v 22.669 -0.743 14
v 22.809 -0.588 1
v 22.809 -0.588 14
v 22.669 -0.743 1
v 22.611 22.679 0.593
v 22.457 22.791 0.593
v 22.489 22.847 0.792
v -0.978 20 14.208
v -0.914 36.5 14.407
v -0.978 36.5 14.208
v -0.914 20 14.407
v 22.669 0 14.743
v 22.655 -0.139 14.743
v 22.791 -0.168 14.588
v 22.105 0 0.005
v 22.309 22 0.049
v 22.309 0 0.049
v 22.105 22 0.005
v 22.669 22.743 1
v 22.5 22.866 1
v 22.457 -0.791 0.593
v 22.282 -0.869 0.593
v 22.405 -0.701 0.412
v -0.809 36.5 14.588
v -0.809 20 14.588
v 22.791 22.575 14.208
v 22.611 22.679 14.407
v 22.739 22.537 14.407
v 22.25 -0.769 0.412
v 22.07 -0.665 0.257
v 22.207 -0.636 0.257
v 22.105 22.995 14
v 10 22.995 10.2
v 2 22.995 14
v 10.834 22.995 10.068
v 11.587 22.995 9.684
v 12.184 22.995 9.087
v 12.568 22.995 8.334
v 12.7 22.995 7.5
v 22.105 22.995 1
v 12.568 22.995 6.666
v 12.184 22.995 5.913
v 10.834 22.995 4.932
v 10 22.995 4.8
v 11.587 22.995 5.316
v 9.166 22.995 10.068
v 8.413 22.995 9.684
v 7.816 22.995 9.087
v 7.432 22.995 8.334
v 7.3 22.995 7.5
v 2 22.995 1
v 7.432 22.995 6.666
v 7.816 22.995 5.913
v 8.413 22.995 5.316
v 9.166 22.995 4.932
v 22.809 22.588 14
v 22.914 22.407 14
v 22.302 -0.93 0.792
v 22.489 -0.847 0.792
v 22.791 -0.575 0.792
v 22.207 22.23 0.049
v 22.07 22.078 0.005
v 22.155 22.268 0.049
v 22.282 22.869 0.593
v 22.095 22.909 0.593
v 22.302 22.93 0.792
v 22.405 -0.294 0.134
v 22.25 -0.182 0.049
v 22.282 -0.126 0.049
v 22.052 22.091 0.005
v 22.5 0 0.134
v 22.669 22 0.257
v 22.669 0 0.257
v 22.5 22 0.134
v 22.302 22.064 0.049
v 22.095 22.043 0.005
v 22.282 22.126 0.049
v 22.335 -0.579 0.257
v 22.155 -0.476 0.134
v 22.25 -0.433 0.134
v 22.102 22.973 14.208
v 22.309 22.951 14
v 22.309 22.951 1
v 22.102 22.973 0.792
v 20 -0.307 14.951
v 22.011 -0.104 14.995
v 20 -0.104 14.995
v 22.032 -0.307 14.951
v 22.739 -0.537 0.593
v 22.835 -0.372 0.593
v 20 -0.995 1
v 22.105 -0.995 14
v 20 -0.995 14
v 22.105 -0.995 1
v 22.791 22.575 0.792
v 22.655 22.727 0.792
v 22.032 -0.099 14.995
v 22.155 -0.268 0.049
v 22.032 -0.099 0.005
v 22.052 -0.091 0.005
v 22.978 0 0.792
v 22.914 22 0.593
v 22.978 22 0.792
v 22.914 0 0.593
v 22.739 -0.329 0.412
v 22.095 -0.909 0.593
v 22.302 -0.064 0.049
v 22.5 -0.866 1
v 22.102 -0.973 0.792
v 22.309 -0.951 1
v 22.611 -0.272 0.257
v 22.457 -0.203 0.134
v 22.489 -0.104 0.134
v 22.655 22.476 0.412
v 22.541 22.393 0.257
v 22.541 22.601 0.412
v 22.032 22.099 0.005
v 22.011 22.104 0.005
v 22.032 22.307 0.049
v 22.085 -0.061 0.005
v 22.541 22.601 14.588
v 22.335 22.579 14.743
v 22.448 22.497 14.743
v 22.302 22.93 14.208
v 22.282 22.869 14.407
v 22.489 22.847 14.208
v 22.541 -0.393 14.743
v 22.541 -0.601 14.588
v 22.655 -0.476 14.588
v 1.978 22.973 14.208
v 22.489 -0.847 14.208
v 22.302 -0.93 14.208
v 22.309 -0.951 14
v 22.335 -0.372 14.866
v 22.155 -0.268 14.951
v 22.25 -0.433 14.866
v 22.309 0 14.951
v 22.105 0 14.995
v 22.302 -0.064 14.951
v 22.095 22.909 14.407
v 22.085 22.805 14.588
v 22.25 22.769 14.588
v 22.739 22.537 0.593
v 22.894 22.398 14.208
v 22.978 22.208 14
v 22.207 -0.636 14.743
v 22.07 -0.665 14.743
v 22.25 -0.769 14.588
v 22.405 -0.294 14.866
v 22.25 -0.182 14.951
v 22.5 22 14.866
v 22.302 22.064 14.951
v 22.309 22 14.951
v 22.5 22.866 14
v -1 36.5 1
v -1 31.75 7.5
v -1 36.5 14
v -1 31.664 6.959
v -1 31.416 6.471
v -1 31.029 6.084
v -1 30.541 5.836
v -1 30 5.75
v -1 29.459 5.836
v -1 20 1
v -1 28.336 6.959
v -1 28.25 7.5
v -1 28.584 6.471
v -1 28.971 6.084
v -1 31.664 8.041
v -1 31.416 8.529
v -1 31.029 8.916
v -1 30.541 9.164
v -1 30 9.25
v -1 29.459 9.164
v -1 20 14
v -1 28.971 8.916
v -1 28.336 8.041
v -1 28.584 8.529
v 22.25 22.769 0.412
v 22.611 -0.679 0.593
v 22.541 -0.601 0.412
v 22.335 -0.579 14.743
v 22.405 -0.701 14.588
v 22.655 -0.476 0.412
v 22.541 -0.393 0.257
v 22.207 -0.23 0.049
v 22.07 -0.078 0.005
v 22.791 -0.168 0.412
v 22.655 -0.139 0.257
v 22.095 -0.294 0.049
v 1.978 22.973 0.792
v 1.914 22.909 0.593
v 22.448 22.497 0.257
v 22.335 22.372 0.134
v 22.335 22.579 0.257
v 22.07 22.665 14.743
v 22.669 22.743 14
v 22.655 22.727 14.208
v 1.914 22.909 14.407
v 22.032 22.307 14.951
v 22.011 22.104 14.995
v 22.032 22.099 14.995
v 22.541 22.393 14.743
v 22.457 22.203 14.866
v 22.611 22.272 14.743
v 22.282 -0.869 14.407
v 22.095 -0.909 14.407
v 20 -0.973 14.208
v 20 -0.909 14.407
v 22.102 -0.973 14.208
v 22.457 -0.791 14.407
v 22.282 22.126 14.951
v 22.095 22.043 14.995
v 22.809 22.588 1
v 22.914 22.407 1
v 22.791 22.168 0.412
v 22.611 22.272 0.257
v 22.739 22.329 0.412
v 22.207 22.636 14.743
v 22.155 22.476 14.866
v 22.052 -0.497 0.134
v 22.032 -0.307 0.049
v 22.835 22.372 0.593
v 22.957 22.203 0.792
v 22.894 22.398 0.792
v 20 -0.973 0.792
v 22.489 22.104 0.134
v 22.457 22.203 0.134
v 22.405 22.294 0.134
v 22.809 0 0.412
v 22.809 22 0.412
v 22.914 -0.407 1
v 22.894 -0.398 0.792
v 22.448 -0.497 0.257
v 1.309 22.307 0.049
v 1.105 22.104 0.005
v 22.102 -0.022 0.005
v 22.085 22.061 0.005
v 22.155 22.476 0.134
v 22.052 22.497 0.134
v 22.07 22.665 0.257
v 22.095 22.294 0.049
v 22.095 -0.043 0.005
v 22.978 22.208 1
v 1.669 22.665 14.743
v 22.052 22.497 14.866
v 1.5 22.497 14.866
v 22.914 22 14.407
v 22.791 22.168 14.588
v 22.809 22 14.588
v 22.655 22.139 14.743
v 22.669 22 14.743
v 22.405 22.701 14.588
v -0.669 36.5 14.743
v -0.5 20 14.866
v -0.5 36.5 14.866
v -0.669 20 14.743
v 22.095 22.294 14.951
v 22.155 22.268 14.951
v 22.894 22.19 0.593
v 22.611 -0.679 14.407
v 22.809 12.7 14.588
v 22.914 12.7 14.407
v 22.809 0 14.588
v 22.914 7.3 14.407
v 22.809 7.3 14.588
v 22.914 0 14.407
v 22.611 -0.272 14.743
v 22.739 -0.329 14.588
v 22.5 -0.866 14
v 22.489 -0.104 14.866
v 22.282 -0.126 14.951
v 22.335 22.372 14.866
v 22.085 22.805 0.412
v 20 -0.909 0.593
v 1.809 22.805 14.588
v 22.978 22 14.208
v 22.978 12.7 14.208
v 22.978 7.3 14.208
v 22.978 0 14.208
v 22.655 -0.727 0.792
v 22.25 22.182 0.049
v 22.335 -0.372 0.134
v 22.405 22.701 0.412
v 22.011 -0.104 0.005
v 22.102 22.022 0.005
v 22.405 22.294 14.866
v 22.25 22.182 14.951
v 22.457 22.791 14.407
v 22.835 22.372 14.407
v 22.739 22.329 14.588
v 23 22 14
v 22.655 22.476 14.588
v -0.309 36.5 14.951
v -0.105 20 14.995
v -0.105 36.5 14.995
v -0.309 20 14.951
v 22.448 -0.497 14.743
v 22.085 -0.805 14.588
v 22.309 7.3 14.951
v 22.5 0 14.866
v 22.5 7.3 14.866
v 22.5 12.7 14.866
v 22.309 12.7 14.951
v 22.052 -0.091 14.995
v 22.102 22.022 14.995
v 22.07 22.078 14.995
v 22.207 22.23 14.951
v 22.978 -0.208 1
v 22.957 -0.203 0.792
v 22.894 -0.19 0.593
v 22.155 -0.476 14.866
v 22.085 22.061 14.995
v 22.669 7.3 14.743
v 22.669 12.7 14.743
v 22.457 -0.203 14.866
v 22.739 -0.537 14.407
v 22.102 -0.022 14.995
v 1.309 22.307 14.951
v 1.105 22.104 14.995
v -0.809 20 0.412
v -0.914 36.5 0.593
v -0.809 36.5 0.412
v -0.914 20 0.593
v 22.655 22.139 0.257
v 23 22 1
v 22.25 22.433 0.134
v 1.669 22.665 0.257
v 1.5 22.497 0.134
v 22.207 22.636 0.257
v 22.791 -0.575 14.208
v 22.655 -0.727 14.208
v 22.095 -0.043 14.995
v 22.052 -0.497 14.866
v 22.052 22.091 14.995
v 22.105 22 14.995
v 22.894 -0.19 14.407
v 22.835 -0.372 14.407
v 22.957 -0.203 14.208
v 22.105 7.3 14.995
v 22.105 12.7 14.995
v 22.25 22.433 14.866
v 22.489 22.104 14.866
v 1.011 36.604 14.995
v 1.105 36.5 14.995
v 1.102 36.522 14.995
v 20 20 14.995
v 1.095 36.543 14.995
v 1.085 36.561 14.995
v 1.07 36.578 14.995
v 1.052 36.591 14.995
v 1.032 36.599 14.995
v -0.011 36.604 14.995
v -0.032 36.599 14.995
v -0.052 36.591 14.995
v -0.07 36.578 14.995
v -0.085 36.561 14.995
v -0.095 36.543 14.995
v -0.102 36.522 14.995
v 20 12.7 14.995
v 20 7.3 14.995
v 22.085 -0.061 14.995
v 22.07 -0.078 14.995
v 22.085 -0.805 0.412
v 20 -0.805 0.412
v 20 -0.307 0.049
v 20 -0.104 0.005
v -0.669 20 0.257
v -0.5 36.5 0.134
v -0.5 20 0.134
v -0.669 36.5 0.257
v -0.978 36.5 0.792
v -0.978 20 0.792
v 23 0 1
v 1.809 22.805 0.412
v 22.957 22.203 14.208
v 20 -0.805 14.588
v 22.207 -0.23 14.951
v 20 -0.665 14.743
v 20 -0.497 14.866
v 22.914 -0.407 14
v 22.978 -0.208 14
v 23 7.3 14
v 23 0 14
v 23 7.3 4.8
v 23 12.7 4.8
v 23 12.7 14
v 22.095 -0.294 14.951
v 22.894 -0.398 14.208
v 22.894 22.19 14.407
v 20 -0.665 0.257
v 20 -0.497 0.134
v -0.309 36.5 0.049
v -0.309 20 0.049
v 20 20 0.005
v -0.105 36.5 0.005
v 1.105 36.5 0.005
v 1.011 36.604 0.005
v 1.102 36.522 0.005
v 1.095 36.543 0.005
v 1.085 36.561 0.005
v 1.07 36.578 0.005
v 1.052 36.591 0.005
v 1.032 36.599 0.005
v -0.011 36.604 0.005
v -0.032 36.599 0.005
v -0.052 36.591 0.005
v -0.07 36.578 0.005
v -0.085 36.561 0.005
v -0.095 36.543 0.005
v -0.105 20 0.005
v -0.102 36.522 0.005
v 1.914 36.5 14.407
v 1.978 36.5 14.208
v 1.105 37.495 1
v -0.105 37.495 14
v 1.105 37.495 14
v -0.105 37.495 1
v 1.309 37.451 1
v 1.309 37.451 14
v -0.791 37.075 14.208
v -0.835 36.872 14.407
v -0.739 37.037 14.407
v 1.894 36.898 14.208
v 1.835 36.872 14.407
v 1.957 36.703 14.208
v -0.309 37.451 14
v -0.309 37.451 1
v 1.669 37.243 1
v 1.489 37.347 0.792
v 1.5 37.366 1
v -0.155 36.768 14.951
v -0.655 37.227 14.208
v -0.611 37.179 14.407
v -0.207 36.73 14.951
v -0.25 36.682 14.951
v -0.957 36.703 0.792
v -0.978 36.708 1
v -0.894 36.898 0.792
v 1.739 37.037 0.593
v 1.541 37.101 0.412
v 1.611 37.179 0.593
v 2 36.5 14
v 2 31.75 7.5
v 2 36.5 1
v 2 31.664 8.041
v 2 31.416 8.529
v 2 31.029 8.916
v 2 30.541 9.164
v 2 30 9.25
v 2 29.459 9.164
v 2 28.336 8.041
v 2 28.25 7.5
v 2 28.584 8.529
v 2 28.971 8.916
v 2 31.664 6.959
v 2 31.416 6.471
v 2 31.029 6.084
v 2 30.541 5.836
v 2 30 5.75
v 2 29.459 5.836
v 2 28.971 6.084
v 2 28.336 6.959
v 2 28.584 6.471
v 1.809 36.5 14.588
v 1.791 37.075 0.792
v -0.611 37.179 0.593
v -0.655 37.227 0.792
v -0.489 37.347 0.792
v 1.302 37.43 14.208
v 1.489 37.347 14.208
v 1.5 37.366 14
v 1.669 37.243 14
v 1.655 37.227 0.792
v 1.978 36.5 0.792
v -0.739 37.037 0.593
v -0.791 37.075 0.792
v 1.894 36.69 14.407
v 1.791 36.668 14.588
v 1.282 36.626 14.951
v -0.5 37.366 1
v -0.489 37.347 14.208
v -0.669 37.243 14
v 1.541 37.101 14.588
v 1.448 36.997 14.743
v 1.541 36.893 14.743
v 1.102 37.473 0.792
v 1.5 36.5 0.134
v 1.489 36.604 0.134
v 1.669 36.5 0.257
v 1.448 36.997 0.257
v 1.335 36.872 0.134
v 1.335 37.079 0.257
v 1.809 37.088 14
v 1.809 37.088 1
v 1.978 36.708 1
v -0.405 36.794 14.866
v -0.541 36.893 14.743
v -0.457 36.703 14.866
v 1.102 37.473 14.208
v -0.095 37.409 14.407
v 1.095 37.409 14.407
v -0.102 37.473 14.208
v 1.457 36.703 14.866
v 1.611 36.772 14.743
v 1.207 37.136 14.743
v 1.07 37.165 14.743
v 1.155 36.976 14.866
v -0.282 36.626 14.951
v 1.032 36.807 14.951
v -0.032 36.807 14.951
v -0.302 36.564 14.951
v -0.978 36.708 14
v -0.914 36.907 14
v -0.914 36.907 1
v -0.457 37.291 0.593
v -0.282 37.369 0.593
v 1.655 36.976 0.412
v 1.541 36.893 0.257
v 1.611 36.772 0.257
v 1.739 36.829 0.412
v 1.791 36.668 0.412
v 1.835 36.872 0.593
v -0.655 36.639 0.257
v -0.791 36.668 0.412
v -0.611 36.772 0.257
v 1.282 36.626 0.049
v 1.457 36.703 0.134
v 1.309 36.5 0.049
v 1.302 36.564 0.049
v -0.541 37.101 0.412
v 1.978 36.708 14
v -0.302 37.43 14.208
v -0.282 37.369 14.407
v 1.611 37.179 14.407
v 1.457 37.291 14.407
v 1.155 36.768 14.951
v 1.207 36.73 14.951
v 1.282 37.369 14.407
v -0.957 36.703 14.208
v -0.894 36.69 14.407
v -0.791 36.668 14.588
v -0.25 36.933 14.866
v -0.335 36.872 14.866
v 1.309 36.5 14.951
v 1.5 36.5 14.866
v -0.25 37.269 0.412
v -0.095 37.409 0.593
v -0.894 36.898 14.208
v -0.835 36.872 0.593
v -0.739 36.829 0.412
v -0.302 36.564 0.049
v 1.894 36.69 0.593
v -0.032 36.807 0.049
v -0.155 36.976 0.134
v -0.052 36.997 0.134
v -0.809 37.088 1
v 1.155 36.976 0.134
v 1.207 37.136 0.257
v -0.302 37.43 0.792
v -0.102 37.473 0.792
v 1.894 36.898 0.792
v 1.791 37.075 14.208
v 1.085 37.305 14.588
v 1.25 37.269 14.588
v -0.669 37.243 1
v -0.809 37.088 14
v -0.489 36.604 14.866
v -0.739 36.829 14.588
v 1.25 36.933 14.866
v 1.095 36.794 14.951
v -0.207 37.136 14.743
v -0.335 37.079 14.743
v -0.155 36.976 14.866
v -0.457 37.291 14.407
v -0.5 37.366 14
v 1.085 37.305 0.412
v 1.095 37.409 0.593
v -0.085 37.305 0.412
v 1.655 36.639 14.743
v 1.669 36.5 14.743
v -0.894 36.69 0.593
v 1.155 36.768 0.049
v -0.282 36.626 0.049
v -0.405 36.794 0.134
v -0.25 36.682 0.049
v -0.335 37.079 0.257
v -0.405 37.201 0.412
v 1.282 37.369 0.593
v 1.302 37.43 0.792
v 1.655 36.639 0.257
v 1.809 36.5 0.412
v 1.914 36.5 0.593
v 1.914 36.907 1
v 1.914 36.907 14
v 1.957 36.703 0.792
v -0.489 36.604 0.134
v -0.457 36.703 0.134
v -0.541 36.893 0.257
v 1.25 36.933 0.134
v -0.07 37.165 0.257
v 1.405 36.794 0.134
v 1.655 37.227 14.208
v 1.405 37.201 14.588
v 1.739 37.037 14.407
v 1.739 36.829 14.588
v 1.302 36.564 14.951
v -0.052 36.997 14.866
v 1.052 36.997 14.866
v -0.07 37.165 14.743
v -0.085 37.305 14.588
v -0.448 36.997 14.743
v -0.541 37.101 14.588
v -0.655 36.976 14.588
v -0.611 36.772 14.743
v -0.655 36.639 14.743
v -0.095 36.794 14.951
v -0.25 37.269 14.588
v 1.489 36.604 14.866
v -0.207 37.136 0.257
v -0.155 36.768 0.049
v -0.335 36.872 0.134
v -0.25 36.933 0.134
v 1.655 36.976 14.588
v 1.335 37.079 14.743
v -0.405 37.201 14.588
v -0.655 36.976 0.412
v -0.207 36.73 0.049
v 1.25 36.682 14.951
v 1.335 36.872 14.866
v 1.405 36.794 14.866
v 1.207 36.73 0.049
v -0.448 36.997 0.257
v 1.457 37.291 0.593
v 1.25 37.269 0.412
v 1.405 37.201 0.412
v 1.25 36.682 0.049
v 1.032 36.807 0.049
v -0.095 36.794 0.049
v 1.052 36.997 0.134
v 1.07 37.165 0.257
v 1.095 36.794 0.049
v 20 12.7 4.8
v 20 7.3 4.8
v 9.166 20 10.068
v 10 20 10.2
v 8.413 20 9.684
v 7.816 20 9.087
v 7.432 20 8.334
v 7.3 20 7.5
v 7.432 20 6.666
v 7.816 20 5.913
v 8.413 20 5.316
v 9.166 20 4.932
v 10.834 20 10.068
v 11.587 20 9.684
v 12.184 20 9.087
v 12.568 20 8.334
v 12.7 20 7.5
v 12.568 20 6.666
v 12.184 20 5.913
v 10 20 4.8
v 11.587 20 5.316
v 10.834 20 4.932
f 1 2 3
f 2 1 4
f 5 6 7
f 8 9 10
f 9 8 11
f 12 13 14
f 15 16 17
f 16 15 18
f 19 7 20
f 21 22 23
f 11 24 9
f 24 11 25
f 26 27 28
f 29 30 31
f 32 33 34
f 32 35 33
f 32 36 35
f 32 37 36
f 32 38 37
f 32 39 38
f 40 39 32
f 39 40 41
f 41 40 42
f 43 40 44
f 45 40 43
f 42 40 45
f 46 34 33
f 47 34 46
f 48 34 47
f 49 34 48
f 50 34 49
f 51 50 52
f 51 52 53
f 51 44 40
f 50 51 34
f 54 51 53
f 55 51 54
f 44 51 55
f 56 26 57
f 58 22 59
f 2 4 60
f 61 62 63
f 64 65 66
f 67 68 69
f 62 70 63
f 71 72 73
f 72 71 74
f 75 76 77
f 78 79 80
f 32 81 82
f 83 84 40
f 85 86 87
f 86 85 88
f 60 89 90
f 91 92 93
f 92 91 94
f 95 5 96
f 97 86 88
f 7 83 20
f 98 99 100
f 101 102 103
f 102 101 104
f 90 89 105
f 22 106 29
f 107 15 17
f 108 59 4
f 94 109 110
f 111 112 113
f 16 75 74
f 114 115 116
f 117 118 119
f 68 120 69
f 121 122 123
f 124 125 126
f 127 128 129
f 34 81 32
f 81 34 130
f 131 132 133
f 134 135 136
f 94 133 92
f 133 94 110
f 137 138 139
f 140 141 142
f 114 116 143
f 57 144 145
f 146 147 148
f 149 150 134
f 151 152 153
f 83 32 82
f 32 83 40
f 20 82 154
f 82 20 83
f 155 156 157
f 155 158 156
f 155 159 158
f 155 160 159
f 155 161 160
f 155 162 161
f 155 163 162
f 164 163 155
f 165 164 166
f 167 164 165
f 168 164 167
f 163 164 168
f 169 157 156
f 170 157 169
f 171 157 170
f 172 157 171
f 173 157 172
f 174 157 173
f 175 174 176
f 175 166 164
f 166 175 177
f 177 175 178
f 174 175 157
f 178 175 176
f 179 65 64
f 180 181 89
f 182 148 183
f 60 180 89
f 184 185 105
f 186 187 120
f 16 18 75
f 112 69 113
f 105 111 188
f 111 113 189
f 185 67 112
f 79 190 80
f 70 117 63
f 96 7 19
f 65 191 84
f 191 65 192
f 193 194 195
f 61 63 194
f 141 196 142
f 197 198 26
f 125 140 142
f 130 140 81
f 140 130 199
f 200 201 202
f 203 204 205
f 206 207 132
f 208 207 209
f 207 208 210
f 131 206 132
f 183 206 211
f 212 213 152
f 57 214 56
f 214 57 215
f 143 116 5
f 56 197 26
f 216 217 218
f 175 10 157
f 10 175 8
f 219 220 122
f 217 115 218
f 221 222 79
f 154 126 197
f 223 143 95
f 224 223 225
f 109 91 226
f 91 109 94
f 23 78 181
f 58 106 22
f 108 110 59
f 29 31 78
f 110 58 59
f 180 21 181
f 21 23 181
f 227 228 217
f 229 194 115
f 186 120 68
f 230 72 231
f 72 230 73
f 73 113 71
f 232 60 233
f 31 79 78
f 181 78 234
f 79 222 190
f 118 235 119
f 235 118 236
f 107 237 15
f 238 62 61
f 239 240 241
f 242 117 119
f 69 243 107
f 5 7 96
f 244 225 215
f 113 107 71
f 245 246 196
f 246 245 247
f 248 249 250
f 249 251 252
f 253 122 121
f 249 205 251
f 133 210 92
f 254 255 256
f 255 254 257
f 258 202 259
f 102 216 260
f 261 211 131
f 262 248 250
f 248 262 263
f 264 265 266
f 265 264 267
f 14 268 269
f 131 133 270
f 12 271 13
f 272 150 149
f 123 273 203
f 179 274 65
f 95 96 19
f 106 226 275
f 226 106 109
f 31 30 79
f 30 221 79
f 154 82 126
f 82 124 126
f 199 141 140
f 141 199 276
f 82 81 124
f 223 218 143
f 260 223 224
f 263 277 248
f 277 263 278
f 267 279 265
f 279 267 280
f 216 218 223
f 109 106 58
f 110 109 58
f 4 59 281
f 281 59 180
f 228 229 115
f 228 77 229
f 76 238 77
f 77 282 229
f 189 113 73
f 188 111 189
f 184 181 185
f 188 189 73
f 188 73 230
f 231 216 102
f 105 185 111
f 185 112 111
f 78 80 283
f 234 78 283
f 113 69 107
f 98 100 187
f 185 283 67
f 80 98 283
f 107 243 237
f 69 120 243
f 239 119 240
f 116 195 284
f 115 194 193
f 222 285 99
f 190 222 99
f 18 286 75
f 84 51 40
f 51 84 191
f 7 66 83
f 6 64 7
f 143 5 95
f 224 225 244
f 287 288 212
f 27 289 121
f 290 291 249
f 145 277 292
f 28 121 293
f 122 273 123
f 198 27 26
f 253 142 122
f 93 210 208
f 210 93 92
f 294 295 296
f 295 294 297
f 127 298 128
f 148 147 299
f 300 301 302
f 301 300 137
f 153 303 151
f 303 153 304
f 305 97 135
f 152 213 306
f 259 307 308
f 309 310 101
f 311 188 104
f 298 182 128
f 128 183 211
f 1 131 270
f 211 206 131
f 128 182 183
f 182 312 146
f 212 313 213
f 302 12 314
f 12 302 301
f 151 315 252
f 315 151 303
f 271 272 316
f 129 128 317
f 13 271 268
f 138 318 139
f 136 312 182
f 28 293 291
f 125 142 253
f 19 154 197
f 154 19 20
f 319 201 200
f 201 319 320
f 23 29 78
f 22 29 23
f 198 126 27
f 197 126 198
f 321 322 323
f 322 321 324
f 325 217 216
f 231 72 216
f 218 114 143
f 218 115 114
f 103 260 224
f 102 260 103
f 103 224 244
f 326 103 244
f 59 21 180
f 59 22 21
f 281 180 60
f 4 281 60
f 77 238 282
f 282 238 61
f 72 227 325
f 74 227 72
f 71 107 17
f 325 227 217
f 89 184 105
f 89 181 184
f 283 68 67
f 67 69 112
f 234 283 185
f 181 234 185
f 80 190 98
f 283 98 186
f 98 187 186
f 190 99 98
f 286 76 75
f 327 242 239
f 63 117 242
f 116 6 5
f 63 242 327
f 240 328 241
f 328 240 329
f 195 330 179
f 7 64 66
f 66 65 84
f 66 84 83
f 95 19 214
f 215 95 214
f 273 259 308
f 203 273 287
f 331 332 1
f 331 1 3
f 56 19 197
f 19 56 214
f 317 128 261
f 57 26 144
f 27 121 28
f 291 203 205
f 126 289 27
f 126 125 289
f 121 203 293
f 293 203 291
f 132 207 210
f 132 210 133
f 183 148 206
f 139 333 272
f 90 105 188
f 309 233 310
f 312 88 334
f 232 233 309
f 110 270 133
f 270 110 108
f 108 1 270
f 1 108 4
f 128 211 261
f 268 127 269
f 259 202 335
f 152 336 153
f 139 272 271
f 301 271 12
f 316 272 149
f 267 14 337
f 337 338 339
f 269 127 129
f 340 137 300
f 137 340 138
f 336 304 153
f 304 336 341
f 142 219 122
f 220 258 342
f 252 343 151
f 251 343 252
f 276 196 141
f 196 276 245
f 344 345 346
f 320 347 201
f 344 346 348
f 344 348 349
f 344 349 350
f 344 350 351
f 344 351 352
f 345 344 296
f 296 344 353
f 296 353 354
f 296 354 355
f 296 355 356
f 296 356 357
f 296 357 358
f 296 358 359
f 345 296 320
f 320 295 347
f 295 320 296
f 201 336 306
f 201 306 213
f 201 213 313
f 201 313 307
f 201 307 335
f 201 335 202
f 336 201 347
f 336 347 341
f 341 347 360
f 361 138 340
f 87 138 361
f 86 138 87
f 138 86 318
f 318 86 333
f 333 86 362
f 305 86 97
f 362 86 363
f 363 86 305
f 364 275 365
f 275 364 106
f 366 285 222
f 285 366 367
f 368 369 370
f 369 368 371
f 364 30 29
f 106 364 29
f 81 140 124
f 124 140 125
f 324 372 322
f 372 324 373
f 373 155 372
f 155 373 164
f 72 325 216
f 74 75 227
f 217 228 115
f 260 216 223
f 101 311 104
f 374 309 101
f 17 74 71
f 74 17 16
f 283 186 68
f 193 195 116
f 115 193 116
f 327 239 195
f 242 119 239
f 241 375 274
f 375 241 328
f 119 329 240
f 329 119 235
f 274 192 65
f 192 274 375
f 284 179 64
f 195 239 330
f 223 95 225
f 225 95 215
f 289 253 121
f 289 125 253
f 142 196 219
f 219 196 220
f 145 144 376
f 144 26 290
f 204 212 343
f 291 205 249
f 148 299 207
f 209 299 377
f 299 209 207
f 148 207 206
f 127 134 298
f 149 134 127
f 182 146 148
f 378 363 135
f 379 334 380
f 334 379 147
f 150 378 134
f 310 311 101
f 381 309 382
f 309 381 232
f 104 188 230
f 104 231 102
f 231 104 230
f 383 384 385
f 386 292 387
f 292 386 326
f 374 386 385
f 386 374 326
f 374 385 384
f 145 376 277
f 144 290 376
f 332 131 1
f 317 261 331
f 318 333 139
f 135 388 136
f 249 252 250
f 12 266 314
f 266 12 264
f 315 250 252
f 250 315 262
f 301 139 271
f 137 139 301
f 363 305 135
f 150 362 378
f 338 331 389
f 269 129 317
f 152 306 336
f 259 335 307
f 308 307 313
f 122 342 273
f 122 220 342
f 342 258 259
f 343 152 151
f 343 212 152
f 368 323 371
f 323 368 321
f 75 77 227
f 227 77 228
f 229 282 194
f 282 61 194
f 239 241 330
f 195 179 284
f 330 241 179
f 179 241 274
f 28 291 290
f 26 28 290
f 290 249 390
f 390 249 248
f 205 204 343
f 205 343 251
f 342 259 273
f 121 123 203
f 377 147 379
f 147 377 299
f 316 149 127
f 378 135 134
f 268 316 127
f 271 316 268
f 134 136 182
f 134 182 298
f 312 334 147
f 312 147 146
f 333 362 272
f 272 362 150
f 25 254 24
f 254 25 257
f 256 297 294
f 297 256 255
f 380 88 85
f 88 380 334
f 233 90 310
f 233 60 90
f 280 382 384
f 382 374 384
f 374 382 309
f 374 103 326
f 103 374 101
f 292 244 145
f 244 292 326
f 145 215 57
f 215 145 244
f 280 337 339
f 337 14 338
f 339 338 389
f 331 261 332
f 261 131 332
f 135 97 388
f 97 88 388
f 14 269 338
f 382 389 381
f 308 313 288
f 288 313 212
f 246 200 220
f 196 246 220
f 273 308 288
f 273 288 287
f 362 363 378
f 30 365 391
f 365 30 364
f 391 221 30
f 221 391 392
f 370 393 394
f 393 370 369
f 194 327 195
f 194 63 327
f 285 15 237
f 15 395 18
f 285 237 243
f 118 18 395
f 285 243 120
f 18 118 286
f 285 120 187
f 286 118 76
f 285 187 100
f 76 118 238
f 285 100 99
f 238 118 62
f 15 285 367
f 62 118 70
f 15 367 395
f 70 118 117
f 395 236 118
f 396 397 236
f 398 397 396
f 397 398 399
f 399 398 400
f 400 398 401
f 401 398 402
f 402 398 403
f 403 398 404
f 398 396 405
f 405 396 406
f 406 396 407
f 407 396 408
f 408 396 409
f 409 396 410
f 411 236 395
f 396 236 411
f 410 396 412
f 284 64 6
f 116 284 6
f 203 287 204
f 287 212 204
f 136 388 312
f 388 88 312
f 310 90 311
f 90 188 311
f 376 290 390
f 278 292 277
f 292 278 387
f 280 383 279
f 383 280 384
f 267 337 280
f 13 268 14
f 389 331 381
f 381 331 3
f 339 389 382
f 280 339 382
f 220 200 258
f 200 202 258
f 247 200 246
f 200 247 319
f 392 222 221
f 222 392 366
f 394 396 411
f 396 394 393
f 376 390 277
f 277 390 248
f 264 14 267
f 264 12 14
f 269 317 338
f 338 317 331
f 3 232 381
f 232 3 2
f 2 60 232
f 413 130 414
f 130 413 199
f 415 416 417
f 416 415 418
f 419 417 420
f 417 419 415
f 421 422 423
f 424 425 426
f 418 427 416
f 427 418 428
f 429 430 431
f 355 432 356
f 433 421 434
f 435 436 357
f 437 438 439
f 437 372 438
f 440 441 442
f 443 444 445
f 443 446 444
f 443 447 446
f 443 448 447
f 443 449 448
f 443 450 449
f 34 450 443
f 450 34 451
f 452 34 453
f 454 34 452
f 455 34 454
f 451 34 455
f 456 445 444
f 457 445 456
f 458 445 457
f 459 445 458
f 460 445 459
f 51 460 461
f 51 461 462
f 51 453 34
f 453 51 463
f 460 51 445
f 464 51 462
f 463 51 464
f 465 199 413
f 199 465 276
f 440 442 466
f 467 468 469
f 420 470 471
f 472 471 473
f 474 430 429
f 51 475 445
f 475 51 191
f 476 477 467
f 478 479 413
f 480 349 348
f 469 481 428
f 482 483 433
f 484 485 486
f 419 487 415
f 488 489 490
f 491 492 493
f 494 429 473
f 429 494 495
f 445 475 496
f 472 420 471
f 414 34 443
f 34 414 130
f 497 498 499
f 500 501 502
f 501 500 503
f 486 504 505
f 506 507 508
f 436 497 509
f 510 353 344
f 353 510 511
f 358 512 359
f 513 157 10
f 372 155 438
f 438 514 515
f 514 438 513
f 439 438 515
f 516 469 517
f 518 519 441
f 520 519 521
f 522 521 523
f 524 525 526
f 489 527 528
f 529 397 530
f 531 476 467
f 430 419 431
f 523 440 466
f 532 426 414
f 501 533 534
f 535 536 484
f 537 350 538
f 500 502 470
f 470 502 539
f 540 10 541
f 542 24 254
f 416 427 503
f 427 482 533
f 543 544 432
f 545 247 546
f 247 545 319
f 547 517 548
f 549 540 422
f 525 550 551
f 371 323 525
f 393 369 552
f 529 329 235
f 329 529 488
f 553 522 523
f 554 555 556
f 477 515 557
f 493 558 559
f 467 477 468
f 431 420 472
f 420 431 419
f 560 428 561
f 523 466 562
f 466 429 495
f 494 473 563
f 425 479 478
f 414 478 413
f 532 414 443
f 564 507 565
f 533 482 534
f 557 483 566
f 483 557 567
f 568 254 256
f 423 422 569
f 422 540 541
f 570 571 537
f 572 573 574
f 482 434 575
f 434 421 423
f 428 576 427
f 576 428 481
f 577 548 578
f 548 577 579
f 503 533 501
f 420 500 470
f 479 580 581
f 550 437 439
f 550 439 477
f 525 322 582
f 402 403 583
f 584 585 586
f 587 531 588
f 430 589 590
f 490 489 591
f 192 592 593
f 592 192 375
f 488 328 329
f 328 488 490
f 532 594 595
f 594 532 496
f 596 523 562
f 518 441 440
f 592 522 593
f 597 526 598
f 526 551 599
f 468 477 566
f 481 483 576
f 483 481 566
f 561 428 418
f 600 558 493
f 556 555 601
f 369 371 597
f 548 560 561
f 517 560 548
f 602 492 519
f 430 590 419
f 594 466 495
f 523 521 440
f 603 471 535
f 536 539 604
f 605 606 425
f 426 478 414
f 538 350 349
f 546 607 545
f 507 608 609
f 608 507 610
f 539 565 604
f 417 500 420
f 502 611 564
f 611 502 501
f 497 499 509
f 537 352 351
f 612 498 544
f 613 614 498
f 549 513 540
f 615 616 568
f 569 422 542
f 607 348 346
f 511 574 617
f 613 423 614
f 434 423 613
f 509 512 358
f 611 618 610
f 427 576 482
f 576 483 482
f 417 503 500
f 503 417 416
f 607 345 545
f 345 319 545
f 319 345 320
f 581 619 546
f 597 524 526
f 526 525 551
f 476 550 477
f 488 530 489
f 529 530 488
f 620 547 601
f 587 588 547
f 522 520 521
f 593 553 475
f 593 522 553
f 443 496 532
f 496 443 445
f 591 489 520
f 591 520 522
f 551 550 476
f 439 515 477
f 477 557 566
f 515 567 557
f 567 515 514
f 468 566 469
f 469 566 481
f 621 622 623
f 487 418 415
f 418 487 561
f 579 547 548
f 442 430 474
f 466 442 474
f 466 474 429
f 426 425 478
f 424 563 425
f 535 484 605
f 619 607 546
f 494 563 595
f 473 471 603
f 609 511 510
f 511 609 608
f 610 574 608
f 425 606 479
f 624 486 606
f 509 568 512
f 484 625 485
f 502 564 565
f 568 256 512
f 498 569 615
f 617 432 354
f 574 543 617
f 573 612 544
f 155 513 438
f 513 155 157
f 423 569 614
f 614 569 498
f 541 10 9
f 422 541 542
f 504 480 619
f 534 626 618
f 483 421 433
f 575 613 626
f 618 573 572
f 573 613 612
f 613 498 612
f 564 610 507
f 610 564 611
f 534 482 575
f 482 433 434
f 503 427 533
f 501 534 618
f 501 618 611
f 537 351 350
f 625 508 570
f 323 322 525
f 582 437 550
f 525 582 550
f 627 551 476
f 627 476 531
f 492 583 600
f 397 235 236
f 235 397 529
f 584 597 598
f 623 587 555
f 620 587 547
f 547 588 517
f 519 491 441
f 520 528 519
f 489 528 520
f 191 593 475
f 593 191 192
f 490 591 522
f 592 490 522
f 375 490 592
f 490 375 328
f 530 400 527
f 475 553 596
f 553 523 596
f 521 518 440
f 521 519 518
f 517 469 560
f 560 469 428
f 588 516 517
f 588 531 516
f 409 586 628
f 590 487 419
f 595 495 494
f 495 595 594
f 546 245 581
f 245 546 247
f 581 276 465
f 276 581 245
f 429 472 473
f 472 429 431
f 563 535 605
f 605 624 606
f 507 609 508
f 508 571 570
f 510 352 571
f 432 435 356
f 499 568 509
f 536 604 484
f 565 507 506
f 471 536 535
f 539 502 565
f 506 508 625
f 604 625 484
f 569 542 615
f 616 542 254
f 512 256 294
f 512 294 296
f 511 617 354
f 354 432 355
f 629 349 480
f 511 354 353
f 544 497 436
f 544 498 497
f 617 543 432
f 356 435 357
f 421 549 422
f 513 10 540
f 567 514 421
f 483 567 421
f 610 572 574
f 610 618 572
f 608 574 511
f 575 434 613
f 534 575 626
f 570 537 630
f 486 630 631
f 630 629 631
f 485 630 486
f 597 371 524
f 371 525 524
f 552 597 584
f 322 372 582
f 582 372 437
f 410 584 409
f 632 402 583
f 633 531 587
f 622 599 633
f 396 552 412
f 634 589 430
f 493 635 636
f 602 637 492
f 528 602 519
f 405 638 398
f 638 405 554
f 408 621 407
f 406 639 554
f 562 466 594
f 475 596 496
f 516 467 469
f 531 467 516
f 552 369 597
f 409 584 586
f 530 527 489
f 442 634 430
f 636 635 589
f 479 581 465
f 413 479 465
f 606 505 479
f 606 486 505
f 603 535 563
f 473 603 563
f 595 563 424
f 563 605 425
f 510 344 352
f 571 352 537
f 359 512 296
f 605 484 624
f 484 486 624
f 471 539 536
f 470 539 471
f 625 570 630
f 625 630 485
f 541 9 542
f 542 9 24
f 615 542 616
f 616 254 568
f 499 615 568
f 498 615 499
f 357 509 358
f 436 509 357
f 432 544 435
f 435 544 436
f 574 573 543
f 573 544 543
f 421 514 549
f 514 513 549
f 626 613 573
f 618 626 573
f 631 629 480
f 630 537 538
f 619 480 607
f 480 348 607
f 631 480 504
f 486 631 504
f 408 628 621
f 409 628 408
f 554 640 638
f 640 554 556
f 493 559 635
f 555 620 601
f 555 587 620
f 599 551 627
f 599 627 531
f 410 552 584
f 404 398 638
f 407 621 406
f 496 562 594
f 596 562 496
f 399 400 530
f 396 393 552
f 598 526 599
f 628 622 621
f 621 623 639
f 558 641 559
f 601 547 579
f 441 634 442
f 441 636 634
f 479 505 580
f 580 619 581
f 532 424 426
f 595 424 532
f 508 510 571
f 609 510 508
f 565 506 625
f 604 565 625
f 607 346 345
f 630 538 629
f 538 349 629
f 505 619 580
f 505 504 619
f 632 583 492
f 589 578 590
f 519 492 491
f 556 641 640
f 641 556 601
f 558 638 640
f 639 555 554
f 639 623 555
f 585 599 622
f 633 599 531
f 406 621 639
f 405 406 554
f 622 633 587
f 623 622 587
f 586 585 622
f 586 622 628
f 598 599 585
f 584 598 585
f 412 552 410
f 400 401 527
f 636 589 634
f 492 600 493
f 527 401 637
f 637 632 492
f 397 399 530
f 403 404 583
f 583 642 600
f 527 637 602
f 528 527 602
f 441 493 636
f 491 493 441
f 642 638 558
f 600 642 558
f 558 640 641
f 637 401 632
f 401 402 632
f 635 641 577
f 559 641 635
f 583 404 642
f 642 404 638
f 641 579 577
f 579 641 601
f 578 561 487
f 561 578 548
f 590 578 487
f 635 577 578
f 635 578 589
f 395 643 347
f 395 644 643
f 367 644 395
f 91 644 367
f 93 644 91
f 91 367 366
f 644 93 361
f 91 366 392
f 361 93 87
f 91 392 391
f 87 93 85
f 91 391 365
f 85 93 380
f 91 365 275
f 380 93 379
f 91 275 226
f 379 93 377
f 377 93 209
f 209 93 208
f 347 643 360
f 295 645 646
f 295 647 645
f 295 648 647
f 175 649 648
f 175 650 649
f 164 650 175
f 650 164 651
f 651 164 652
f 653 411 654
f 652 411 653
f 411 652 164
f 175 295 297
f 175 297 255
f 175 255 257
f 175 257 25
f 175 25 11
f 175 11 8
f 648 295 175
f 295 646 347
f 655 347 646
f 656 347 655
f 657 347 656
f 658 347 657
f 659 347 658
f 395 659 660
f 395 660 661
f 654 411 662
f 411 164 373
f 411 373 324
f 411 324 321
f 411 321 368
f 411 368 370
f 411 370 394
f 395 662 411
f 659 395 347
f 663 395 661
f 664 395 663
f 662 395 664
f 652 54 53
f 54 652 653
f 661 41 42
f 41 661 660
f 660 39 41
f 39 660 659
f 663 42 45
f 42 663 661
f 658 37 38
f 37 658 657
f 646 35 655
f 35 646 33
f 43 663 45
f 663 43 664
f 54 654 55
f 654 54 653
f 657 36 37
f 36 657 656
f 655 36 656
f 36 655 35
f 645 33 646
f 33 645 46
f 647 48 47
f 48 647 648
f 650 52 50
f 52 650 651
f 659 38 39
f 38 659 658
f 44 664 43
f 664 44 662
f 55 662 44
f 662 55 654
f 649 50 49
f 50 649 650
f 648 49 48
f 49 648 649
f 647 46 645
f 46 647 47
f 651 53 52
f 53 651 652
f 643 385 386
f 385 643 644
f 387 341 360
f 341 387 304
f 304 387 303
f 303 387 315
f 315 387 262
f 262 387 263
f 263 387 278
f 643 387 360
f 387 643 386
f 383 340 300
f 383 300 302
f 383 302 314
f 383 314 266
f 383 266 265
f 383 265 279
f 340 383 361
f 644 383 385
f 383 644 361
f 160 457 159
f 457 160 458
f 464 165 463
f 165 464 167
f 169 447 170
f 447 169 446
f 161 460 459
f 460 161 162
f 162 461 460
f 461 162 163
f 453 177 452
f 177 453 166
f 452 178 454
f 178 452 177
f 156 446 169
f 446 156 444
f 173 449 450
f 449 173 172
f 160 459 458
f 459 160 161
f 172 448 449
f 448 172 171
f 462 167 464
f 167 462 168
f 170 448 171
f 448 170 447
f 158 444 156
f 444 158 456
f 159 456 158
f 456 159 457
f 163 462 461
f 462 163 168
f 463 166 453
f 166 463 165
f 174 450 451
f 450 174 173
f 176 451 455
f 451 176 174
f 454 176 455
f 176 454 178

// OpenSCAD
// Aluminium extrusion variable bed mount
// by neb1, 2019, https://www.thingiverse.com/neb1/about

$fn = 30+0;

/* [Extrusion] */

// Extrusion size
EXT = 20; // [15:1515, 20:2020, 30:3030, 40:4040]
// Screw hole diameter for extrusion mount (e.g. 5.4mm for M5 screws)
EXT_hole_dia = 5.4; 

/* [Mount] */

// Bed distance measured from extrusion edge
s_distance = 10; 
// mount strength in (mm)
s_thickness = 3;
// Mount width (mm)
s_height = 15;
// Bed mount screw hole diameter (e.g. 3.5mm for M3)
s_hole_dia = 3.5; 

difference() {
    // support frame 
    minkowski() {
        translate([0,0,1])
        union() {
            cube([EXT+s_thickness-1, EXT+s_thickness-1, s_height-2]);
            translate([0, EXT, 0])
            cube([s_thickness-2, s_distance + s_height/2 - 1, s_height-2]);
        }
        sphere(r = 1);
    }
    
    // extrusion 
    translate([-5,-5,-50]) cube([EXT+5, EXT+5, 100]);
    
    // extrusion mount hole
    translate([EXT/2, EXT-5, s_height/2])
        rotate([-90,0,0])
            cylinder(d=EXT_hole_dia, h=s_thickness+10, $fn=20);
    
    // slide-in-mount
    translate([EXT-5, (EXT-EXT_hole_dia)/2, (s_height-EXT_hole_dia)/2])
        cube([s_thickness+10, EXT_hole_dia, s_height/2 + s_hole_dia]);
    
    // cutout for bedmount screw hole
    translate([0, EXT, 0])
    translate([-5, s_distance, s_height/2]) {
        rotate([0, 90, 0]) {
            cylinder(d=s_hole_dia, h=s_thickness+10, $fn=20);
        }
    }
    
}
